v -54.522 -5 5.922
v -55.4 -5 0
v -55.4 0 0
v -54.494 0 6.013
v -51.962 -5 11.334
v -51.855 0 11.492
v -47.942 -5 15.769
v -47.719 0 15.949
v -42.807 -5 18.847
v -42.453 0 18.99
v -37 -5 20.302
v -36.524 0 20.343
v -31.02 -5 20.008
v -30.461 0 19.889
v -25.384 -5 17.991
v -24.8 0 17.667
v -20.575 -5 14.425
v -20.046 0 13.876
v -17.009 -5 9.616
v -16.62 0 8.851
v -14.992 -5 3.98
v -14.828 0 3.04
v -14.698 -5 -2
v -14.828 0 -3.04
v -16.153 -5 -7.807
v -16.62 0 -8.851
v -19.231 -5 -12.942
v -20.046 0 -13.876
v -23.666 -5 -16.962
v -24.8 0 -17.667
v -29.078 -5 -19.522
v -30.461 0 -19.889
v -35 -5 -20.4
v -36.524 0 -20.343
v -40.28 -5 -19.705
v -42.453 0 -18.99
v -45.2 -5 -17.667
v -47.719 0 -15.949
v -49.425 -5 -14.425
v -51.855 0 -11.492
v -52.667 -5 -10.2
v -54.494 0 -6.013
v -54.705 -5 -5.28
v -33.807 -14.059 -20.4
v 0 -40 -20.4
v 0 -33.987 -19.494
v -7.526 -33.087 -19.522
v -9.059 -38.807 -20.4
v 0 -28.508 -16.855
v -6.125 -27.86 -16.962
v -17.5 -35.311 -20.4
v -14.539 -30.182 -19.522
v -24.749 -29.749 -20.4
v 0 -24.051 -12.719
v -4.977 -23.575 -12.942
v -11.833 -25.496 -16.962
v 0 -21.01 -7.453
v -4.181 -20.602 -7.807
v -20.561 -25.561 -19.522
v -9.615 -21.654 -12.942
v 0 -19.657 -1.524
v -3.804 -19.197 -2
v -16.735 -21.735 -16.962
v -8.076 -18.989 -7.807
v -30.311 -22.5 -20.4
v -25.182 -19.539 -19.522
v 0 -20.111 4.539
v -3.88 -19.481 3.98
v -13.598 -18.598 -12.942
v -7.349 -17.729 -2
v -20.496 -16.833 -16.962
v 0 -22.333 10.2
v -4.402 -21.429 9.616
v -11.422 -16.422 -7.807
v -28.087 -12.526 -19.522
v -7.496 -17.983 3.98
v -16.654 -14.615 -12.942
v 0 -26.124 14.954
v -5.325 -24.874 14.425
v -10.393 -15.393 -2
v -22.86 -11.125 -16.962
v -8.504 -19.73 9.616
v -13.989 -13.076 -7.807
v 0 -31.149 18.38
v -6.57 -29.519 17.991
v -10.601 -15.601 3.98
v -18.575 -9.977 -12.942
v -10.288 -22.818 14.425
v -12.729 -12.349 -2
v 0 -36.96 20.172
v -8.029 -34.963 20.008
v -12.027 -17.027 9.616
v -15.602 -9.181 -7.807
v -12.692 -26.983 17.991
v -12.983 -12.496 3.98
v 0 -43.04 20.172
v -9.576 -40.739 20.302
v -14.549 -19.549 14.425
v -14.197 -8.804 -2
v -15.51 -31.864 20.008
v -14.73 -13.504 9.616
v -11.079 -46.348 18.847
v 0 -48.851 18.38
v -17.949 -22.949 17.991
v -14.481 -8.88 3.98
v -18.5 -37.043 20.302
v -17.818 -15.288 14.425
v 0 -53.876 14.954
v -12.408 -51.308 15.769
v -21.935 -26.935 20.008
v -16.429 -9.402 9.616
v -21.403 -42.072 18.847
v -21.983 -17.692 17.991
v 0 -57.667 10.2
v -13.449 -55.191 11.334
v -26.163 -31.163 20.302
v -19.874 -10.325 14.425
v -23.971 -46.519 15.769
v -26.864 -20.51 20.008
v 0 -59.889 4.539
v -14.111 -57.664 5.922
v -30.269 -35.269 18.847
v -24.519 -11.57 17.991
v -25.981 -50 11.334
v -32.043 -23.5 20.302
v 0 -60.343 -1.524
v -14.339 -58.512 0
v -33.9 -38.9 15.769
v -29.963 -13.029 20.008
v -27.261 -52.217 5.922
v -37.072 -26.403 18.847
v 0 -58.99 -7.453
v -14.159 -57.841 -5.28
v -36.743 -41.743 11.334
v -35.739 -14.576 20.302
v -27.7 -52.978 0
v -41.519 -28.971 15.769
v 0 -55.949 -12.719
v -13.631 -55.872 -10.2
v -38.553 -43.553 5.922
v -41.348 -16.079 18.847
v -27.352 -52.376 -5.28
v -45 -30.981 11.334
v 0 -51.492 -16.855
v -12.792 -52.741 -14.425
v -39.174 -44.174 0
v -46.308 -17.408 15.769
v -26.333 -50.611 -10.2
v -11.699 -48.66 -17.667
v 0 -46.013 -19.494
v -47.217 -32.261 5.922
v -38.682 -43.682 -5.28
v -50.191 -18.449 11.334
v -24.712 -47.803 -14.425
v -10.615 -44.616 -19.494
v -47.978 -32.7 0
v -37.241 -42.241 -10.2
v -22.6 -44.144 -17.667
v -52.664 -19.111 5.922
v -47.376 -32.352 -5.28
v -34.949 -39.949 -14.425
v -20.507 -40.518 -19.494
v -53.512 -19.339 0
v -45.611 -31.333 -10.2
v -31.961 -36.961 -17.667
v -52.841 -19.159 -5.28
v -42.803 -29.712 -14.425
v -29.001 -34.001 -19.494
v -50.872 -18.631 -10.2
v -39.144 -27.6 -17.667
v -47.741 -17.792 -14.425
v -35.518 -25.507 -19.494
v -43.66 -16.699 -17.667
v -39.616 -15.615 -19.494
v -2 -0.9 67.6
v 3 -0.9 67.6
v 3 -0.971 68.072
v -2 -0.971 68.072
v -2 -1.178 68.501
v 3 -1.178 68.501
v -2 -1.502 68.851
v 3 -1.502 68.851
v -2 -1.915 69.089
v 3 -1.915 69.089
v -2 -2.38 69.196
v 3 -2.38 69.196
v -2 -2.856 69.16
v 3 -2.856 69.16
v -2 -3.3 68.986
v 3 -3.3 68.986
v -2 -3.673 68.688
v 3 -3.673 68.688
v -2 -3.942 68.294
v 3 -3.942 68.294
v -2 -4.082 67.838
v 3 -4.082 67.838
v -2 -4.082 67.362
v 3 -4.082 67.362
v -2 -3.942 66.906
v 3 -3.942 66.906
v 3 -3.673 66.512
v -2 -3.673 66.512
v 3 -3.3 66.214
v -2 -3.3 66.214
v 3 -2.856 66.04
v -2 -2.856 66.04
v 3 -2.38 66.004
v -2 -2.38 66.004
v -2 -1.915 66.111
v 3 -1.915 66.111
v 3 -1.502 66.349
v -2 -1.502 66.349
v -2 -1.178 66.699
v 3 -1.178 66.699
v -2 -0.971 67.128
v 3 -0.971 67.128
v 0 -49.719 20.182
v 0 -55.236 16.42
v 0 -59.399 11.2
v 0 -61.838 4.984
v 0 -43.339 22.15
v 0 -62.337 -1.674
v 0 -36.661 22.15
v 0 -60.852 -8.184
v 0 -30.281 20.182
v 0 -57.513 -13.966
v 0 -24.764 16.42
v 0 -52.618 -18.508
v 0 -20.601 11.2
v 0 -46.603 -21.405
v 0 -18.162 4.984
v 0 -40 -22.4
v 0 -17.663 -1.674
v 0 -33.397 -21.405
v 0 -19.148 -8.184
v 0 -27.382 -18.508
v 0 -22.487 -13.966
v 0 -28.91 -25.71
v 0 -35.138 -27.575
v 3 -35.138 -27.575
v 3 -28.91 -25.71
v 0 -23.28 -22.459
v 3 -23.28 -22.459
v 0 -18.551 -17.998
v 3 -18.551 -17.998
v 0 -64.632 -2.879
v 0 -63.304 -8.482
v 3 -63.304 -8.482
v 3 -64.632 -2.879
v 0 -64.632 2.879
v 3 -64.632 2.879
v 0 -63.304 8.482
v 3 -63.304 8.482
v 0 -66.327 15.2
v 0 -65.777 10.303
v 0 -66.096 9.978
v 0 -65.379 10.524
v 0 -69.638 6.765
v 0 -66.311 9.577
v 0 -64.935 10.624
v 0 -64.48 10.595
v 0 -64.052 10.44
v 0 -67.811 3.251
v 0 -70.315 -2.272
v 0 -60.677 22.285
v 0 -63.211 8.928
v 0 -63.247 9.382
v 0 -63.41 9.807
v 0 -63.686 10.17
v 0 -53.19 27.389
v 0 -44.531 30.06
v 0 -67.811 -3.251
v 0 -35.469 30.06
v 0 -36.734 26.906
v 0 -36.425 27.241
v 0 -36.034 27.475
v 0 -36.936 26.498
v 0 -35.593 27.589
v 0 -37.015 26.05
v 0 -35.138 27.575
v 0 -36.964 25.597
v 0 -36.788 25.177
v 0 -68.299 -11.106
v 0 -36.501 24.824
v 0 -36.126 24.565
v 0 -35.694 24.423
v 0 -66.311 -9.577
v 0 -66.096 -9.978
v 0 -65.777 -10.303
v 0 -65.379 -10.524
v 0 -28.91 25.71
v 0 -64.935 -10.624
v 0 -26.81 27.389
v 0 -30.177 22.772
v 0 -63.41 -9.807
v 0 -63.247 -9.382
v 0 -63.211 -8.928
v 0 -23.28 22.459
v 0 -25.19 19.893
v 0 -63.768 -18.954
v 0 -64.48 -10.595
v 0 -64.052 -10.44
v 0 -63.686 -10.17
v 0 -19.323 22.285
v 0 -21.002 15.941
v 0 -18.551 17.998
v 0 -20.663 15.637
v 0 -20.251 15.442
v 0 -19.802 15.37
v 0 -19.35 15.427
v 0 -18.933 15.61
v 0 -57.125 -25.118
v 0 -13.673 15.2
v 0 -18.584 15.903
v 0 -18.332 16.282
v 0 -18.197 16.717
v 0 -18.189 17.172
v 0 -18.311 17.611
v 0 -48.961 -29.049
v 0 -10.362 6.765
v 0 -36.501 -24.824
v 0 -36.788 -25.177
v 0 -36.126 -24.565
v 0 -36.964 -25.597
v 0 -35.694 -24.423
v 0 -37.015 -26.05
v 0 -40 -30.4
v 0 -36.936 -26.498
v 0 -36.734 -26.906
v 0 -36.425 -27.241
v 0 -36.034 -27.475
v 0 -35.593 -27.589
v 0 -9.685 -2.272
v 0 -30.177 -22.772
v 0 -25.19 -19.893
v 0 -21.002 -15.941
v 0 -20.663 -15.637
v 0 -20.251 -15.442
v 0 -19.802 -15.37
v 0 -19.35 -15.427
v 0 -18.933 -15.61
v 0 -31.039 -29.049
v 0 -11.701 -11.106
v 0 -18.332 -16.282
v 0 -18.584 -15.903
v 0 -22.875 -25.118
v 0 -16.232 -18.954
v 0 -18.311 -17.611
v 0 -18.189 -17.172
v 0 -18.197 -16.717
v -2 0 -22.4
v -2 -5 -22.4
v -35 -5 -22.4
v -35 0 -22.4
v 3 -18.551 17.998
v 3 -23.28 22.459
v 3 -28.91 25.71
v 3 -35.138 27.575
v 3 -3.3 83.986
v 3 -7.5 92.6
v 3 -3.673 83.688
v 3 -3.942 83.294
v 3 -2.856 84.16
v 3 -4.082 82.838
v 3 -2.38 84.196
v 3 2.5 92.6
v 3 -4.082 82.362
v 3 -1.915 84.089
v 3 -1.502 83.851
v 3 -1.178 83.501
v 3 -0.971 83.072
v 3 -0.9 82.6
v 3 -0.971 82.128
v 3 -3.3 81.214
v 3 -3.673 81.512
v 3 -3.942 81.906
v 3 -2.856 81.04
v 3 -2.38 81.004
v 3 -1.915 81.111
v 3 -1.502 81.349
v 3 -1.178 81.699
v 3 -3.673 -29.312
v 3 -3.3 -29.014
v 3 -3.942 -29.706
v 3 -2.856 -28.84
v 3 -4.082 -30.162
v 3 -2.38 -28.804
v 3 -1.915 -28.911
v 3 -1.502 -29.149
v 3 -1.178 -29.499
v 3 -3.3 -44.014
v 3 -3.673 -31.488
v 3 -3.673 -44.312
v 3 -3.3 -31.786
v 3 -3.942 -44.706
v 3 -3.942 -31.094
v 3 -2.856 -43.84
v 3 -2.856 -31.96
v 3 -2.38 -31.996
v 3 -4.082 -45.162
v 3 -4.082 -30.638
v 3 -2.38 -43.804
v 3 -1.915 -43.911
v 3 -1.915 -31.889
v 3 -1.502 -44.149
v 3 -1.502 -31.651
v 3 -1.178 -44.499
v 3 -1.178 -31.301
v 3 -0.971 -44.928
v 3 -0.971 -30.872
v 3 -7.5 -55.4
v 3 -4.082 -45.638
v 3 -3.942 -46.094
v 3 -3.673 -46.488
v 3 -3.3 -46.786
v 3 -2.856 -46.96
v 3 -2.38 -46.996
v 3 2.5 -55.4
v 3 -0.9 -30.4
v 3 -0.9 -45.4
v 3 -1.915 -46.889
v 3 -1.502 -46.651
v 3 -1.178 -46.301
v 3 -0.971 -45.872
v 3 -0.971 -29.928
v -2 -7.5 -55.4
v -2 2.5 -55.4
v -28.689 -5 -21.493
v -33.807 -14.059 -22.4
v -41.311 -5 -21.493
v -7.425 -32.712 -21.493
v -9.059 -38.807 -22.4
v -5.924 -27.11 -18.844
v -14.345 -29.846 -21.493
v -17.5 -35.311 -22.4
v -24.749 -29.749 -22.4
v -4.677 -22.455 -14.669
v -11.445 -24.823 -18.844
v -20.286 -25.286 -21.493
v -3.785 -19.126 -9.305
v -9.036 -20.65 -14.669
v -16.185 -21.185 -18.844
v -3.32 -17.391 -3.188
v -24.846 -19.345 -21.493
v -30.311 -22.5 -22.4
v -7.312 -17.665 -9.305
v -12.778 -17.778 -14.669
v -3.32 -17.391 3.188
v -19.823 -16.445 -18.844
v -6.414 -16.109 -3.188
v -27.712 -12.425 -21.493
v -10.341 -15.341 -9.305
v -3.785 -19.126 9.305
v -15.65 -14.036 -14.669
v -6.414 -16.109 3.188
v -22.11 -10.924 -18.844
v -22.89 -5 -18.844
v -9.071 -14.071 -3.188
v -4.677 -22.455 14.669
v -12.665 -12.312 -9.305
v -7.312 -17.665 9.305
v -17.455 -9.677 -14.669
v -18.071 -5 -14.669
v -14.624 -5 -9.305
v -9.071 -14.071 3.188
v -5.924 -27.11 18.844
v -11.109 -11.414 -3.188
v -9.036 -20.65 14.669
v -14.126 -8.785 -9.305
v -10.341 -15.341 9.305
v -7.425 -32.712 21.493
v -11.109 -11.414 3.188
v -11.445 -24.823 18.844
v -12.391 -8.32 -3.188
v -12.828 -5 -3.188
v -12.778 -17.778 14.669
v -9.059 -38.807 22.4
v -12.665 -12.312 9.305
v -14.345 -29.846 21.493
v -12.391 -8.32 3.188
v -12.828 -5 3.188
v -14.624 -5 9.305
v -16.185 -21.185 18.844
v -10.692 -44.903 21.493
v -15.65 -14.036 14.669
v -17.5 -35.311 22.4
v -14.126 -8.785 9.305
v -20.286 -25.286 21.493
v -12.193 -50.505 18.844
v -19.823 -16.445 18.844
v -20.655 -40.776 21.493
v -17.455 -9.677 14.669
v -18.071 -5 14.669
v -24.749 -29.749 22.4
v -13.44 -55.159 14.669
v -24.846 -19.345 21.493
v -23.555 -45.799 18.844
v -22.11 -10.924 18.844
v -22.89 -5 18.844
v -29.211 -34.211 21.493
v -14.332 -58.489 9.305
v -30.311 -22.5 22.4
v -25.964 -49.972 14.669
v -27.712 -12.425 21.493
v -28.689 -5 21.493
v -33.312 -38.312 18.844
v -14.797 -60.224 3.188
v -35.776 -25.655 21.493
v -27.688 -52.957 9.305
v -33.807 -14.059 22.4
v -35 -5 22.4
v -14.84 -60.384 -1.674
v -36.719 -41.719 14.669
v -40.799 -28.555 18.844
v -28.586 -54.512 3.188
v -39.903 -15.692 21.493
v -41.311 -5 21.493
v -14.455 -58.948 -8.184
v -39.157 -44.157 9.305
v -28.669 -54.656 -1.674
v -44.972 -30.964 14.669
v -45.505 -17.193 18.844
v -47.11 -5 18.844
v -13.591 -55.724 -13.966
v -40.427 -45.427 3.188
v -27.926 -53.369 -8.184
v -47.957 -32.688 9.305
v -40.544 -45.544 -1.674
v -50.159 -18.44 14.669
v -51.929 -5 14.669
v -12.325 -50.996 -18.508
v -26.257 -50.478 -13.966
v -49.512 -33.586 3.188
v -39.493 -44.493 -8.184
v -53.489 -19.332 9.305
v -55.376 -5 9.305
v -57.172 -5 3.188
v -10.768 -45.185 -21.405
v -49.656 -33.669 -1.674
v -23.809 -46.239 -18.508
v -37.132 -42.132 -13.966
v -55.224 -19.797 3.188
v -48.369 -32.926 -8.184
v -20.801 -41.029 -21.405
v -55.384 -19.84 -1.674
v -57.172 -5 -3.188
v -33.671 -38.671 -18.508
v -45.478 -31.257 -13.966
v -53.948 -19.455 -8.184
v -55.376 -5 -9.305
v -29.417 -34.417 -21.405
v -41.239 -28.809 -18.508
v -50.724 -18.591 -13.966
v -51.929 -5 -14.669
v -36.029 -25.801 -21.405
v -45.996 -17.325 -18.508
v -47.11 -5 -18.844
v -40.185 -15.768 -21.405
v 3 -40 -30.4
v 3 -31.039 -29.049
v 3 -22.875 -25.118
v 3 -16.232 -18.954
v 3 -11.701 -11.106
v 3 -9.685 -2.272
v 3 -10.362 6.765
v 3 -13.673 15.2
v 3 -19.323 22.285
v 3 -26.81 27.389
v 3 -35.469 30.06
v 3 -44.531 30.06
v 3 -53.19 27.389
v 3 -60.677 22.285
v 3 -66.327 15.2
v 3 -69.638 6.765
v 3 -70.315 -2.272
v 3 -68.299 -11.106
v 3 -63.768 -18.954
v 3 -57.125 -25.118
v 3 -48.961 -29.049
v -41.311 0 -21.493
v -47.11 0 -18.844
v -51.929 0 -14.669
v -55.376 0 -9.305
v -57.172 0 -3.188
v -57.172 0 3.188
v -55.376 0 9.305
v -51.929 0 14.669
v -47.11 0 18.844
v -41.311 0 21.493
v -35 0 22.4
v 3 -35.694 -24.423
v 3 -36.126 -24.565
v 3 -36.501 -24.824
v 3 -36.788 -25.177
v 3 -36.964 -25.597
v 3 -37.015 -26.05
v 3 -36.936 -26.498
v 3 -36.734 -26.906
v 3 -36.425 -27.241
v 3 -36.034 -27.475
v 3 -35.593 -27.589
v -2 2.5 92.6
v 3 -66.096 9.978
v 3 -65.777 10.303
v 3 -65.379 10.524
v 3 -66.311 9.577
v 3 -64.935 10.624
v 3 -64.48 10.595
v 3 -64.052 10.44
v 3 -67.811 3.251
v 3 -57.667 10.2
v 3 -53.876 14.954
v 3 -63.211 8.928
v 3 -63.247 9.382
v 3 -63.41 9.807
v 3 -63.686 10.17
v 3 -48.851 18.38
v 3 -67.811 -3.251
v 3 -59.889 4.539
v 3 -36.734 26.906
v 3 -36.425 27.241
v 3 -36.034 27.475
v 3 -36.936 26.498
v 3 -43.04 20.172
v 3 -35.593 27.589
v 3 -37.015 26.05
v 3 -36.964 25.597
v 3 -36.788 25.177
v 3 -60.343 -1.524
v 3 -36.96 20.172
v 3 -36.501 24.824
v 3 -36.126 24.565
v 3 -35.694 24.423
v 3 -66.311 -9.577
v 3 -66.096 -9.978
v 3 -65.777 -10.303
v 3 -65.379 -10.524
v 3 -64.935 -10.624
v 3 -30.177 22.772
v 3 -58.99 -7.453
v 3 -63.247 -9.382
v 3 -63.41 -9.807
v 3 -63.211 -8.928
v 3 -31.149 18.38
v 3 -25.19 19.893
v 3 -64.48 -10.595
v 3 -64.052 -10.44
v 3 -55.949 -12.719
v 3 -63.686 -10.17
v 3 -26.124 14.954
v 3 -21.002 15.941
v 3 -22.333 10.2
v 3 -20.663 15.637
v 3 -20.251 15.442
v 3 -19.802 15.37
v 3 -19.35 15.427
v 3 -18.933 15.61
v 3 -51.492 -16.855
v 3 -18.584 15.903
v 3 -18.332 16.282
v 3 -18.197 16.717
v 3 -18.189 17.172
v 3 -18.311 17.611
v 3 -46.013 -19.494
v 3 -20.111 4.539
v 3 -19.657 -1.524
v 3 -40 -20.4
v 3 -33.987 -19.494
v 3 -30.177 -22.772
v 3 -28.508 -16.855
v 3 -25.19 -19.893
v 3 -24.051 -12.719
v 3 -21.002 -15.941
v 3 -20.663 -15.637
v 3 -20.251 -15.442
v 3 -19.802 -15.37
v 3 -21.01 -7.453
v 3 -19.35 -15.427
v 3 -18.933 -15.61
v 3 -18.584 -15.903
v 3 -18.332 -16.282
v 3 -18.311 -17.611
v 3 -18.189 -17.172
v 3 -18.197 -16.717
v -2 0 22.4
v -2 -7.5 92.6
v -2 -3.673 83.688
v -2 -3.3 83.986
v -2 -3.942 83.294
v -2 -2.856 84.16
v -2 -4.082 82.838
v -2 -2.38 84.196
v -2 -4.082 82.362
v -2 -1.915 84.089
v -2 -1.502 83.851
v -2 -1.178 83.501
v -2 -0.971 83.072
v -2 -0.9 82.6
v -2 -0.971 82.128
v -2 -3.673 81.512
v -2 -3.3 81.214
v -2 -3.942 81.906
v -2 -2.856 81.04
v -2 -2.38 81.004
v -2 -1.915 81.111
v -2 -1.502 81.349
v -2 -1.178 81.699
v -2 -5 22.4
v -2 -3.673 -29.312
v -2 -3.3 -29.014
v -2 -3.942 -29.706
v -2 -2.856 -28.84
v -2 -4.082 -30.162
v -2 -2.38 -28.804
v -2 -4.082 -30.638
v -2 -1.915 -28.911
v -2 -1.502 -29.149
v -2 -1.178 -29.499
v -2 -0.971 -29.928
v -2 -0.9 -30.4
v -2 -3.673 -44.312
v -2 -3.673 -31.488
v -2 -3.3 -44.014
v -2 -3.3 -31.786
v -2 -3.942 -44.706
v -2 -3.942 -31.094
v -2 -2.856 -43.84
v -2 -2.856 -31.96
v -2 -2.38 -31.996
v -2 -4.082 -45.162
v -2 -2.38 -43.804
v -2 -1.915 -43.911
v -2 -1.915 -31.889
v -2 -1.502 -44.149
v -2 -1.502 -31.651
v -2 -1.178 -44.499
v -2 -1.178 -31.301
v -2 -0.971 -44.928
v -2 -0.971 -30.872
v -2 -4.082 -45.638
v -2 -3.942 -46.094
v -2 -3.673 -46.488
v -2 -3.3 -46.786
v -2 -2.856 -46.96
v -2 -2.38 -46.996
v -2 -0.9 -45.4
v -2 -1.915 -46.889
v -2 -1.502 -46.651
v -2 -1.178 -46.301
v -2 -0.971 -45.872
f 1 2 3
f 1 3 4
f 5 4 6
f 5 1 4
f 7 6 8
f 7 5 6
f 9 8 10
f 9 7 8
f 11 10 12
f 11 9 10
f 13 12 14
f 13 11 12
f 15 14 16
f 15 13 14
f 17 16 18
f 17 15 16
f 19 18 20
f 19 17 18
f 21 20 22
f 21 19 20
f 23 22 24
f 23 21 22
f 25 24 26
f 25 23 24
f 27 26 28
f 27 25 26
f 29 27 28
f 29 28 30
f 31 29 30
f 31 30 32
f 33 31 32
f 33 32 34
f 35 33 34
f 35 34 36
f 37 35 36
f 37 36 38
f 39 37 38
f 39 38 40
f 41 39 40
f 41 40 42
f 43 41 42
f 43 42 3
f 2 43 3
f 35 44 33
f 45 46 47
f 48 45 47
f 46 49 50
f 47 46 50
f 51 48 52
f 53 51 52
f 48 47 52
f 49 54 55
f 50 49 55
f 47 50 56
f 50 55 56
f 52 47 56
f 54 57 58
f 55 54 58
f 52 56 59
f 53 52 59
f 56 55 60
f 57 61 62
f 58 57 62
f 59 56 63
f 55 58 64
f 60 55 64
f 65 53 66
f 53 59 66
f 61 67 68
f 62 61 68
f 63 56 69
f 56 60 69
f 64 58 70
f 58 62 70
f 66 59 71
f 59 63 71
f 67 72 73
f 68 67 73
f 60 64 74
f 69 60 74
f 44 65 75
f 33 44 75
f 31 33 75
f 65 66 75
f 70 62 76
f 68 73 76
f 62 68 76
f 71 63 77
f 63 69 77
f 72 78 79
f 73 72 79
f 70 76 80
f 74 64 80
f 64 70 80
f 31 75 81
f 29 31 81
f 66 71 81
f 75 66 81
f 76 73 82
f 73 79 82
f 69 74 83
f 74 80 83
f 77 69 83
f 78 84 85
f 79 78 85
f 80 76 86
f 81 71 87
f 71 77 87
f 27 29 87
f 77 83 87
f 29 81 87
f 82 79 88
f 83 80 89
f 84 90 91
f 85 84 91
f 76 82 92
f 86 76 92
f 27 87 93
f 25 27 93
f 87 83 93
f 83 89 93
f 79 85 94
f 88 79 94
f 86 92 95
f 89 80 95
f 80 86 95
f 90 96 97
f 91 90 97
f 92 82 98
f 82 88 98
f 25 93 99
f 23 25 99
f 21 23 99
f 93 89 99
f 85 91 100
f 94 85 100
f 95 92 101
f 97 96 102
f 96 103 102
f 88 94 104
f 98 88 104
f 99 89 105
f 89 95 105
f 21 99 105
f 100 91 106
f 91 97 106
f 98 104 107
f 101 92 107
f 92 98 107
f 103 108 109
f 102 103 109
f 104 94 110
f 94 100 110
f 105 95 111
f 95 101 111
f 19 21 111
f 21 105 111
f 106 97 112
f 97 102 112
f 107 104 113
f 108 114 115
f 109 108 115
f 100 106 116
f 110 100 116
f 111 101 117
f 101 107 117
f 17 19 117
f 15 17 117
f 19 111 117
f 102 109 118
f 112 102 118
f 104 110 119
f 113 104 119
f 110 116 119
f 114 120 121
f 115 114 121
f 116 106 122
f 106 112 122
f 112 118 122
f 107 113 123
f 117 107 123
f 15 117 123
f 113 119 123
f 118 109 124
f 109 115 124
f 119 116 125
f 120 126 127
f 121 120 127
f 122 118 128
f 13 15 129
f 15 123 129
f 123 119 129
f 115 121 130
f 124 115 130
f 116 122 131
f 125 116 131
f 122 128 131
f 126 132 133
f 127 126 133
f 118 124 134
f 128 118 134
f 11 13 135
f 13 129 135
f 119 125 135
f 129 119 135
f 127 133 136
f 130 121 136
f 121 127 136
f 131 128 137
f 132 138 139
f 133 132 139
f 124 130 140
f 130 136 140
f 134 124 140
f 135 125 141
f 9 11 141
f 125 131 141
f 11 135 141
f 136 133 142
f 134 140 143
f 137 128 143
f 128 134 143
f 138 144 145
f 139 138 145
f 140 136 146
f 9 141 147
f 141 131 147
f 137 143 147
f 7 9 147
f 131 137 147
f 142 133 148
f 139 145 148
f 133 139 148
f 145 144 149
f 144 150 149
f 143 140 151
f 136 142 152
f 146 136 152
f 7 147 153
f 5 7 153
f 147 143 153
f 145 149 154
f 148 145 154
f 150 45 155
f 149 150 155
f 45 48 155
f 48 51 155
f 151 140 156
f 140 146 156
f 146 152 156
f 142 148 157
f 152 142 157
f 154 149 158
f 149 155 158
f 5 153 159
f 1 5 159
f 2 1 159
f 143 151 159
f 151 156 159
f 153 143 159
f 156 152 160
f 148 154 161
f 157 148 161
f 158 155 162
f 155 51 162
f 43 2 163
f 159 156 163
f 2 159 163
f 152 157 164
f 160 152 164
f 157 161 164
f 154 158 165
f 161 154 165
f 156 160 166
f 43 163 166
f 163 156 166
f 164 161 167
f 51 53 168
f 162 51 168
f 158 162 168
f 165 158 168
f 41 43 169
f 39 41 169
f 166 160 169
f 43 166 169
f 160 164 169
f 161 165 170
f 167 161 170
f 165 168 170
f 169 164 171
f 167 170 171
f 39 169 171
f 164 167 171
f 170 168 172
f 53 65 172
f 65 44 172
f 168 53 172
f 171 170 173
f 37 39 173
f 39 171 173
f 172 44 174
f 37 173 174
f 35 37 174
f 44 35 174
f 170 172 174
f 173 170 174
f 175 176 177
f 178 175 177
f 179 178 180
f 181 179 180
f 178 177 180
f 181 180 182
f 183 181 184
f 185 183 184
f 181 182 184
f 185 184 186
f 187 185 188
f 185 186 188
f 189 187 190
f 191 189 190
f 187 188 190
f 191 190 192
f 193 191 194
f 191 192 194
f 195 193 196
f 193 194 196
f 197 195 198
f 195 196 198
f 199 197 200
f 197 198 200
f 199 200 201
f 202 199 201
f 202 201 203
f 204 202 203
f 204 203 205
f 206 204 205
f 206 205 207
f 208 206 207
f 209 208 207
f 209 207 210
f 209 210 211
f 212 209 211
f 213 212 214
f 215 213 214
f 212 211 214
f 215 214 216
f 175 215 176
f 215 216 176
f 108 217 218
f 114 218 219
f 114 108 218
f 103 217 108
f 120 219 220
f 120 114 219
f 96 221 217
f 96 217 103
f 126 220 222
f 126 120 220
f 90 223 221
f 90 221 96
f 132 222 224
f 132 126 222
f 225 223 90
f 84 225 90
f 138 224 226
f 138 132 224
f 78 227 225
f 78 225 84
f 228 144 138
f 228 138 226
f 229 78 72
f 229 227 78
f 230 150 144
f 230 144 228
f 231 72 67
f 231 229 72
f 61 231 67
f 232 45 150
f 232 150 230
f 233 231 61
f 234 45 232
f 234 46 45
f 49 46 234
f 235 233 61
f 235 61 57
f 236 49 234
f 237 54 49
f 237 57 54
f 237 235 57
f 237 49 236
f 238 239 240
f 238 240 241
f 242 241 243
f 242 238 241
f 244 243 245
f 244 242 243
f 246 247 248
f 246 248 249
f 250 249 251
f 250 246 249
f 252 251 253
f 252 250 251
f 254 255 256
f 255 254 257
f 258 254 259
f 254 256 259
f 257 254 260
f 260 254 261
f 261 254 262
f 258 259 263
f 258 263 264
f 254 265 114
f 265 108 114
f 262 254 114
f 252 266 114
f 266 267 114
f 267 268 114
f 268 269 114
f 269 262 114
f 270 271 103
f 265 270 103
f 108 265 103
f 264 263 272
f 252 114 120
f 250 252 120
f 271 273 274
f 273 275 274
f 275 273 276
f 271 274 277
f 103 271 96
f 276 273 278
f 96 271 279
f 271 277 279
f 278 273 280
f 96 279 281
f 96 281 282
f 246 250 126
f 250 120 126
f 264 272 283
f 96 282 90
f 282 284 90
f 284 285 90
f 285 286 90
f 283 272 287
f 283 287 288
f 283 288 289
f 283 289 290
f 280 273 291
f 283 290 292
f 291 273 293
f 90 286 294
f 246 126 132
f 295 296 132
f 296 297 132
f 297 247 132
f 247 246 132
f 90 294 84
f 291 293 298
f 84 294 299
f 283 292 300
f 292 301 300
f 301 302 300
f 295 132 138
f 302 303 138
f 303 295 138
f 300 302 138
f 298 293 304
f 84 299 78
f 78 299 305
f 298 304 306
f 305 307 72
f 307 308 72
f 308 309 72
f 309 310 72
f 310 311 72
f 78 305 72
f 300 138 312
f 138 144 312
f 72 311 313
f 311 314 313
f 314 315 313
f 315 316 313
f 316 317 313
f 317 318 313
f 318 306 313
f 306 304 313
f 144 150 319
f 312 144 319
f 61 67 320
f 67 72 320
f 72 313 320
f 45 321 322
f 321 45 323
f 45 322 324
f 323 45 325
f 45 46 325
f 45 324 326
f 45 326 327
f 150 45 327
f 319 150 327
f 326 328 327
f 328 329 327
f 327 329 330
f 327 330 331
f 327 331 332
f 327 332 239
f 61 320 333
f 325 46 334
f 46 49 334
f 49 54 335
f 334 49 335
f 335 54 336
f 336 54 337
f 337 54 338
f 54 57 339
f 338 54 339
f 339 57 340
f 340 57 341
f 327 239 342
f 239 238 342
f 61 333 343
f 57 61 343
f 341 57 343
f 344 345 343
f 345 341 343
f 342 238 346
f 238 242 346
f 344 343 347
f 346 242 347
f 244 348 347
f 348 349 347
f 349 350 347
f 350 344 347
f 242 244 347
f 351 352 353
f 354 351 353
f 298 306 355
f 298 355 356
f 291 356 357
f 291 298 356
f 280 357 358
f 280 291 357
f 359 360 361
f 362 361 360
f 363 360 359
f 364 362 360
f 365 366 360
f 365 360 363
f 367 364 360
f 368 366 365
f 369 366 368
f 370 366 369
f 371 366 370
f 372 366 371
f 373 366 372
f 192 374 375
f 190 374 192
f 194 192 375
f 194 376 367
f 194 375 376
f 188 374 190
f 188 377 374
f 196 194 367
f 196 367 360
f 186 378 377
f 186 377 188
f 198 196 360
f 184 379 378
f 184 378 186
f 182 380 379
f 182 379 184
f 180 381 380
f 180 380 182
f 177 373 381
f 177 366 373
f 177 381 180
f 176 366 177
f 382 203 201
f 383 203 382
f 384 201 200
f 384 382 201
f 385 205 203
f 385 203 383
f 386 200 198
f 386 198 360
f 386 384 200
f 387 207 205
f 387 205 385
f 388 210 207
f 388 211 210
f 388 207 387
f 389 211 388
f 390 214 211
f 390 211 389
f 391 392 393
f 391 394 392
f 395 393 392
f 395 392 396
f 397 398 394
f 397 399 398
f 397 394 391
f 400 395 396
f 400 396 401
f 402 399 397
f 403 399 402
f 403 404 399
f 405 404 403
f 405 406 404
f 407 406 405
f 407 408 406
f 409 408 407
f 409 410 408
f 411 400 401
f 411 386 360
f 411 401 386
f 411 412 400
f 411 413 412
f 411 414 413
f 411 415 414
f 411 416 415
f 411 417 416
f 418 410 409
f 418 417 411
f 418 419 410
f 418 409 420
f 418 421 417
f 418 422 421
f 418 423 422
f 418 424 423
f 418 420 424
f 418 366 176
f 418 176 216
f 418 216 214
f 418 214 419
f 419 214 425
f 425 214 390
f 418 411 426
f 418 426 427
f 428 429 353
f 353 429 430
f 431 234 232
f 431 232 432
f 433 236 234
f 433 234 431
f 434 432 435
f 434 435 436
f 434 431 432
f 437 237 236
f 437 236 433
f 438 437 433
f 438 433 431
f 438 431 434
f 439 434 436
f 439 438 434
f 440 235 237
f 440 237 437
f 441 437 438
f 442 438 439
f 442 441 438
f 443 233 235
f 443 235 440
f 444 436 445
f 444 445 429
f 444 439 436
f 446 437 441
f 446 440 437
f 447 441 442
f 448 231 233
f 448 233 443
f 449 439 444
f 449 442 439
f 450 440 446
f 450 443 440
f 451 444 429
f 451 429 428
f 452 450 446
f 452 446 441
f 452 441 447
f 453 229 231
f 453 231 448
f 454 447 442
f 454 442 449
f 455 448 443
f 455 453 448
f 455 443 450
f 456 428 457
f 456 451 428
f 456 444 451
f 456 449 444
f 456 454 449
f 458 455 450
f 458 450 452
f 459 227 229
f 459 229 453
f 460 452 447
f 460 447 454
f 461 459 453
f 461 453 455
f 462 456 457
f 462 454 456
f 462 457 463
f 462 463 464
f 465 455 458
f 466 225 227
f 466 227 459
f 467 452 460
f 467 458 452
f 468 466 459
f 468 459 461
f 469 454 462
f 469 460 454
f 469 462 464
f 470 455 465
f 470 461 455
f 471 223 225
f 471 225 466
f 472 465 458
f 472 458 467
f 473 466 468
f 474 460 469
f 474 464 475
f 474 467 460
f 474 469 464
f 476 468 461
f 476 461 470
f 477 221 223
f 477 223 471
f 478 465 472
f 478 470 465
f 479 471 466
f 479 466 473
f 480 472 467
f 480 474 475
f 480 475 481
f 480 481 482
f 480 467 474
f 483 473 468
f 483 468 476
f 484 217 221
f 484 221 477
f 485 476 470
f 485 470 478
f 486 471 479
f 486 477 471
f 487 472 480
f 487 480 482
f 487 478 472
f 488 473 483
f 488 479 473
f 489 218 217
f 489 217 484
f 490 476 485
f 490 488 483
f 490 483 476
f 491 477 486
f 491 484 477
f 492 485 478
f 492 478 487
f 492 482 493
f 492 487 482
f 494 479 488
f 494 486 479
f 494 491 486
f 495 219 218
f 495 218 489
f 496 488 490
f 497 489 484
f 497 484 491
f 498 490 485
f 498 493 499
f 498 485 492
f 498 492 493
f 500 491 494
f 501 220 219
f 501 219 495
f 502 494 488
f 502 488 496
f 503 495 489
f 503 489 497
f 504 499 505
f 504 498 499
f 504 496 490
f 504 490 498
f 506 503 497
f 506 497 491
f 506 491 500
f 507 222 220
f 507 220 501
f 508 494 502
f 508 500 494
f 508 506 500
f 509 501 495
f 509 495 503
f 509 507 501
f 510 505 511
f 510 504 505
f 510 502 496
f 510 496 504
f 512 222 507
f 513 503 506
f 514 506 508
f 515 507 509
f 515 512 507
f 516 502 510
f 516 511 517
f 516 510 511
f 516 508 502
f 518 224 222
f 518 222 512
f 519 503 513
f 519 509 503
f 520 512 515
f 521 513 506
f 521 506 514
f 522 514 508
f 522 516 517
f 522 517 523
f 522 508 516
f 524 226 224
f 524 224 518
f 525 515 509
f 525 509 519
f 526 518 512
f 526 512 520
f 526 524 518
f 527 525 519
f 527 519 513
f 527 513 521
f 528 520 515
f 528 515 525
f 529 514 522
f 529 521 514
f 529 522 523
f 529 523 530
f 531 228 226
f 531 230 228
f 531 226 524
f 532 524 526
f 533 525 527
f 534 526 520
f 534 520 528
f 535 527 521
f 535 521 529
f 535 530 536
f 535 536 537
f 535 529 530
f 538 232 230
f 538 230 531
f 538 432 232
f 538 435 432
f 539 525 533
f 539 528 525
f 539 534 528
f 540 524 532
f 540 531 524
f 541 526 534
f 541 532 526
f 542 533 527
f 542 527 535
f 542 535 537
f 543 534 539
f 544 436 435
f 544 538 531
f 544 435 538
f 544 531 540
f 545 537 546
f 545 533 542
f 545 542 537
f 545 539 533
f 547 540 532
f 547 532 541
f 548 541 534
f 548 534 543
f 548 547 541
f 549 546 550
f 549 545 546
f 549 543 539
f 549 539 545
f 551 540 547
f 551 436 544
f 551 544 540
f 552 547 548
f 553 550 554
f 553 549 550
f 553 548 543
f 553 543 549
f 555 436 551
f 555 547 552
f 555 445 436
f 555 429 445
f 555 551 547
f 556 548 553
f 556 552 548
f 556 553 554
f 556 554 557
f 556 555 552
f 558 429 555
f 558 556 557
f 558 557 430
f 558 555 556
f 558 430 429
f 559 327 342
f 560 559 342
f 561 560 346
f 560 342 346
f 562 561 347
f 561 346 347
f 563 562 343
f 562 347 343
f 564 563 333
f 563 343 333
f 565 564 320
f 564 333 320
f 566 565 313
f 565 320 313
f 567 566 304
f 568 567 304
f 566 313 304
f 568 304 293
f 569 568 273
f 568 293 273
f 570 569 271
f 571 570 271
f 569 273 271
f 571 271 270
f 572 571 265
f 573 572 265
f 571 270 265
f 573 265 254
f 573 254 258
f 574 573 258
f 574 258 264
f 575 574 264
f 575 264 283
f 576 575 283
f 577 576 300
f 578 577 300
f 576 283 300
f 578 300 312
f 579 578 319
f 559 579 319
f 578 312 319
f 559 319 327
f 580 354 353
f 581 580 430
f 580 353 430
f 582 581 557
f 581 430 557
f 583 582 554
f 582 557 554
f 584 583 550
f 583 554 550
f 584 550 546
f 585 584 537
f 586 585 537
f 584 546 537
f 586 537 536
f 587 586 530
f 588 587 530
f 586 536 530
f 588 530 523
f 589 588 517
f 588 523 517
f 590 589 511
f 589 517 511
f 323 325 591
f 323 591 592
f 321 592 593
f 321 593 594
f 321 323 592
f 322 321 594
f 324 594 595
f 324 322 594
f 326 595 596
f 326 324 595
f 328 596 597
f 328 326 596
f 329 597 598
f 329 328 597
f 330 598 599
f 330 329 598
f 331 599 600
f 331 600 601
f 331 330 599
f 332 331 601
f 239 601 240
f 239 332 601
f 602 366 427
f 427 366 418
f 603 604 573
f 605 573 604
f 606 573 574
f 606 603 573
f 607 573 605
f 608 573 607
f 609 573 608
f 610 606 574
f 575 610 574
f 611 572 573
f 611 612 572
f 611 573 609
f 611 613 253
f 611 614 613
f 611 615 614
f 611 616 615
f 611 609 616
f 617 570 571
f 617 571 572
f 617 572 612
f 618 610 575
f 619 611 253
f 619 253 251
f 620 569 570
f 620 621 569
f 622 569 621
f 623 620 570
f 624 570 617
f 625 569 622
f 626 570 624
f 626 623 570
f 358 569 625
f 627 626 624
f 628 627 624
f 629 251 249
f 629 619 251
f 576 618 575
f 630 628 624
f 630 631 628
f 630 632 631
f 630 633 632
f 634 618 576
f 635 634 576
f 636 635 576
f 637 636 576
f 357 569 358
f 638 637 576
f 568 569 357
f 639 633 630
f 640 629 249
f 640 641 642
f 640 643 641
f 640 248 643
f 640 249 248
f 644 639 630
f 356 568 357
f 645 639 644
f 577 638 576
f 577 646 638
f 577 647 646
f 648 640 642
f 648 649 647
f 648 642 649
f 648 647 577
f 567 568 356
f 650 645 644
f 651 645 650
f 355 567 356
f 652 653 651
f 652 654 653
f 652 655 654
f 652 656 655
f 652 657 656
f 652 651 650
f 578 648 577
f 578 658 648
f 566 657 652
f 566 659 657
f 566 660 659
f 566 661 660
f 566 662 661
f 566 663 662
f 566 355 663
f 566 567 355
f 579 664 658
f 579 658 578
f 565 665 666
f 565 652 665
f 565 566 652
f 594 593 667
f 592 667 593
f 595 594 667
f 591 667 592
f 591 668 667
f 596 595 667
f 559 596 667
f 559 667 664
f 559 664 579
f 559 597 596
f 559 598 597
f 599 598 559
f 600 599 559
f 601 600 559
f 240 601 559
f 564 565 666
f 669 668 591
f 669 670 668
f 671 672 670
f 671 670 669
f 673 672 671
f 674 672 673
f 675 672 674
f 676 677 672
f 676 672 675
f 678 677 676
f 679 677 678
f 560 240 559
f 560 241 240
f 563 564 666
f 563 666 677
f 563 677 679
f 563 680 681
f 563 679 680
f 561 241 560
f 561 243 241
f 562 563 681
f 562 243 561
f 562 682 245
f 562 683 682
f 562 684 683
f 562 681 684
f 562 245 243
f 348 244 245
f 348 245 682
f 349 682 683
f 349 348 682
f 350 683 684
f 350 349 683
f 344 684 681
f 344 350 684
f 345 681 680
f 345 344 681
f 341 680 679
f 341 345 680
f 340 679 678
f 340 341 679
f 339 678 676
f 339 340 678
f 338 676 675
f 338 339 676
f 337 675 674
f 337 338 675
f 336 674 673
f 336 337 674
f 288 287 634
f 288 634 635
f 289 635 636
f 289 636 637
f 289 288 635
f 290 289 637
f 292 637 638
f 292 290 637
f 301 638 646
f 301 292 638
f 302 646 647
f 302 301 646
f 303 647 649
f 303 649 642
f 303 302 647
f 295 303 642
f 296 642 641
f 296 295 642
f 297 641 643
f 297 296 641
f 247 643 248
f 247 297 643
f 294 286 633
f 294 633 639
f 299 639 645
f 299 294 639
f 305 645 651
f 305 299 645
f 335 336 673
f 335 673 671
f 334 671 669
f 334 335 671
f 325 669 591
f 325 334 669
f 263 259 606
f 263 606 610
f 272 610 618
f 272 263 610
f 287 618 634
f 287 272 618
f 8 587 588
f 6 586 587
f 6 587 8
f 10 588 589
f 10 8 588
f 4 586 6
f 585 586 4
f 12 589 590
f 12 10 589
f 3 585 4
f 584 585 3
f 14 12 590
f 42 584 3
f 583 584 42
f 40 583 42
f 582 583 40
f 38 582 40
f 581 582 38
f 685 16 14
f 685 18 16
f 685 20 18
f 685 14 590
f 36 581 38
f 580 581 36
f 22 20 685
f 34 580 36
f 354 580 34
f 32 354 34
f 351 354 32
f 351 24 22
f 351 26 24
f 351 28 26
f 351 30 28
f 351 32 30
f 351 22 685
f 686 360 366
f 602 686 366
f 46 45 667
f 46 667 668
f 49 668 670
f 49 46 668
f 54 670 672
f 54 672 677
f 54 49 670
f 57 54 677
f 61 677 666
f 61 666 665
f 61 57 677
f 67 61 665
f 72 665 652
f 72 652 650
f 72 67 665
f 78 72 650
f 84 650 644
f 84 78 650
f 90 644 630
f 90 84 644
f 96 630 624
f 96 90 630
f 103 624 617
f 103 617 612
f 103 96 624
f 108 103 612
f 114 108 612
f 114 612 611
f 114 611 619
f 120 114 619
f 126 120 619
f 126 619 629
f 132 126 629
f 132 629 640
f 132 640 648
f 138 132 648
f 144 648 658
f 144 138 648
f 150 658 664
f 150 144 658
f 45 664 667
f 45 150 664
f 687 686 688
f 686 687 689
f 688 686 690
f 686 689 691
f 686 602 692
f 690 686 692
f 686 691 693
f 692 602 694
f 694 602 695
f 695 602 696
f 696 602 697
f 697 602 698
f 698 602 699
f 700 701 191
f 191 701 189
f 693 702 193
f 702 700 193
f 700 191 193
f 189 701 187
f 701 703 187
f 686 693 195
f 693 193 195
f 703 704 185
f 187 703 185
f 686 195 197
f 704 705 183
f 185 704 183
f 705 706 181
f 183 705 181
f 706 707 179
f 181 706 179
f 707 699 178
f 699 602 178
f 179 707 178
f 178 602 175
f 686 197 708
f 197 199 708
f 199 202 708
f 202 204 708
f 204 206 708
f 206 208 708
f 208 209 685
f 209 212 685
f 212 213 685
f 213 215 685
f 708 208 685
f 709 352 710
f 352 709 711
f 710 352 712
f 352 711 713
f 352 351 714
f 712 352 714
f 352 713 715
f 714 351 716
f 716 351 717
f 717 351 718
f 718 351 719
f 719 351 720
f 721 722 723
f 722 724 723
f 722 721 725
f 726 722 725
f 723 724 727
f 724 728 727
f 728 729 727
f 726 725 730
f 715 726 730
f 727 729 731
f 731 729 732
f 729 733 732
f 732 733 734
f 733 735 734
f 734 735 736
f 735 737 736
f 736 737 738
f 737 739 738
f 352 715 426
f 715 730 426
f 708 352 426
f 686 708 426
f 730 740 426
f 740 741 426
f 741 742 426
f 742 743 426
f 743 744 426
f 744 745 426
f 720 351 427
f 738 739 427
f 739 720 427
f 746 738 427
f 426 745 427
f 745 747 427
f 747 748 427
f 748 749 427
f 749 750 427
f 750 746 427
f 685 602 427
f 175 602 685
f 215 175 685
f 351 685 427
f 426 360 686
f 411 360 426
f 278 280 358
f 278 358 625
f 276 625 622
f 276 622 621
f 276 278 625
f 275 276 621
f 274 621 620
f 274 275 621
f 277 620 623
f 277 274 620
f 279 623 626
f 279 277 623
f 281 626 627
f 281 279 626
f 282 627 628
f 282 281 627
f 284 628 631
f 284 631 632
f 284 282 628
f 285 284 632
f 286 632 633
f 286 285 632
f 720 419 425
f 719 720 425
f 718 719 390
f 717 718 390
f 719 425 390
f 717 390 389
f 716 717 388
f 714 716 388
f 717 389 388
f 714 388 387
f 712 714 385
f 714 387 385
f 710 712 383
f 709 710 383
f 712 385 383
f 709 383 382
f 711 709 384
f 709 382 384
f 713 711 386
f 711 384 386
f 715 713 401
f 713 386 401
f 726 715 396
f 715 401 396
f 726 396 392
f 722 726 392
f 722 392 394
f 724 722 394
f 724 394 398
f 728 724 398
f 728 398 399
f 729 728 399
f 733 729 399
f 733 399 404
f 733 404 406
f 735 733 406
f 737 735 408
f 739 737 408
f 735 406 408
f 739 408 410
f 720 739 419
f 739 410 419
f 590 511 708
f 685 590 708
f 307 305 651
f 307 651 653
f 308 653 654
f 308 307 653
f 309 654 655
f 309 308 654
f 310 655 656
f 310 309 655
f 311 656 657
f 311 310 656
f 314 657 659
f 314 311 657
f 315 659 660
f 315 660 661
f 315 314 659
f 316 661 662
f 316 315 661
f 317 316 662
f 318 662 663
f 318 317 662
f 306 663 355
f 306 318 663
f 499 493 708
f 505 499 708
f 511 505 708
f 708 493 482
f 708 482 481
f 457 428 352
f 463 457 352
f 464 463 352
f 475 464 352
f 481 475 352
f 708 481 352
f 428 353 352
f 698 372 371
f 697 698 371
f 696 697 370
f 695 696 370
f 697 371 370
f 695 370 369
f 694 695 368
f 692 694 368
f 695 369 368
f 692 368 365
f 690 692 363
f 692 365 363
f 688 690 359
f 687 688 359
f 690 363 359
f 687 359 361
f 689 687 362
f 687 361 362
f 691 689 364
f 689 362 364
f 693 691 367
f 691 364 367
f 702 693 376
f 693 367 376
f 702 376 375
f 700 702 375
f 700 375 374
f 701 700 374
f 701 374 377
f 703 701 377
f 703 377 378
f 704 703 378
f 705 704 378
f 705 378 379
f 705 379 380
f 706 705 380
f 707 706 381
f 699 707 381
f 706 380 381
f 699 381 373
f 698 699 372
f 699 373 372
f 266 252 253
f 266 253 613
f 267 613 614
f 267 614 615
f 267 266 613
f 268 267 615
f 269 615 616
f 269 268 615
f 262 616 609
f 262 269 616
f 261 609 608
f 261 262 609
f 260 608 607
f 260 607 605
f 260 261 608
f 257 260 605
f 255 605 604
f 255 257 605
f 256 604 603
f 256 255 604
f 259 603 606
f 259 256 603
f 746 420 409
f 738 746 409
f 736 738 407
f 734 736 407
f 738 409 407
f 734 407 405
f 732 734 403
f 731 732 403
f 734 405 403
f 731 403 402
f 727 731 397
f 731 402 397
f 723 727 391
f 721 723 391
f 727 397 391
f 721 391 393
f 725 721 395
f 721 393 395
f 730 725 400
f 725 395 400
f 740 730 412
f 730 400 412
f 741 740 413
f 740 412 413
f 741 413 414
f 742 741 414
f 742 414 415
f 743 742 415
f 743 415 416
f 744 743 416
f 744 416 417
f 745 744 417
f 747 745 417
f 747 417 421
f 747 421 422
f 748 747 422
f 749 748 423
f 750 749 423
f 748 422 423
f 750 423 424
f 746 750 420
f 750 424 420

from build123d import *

# Parameters (mm, degrees)
SKETCH1_R           = 22.4
SKETCH1_R_2         = 20.4
REVOLVE1_ANGLE      = 90
SKETCH1_194_R       = 30.4
SKETCH1_194_R_2     = 20.4
BOSS_EXTRUDE1_DEPTH = 3
SKETCH4_R           = 20.4
BOSS_EXTRUDE3_DEPTH = 5
SKETCH5_W           = 148
SKETCH5_H           = 10
SKETCH5_R           = 1.6
BOSS_EXTRUDE4_DEPTH = 5


with BuildPart() as part:
    # Sketch1 → Revolve1 (revolve)
    with BuildSketch(Plane(origin=(0, 0, 0), x_dir=(0, 0, -1), z_dir=(1, 0, 0))):
        with Locations((0, -40)):
            Circle(SKETCH1_R)
        with Locations((0, -40)):
            Circle(SKETCH1_R_2, mode=Mode.SUBTRACT)
    revolve(axis=Axis((0, -5, 90.771329453), (0, 0, -1)), revolution_arc=REVOLVE1_ANGLE)

    # Sketch4 → Boss-Extrude3 (add)
    with BuildSketch(Plane(origin=(0, -5, 0), x_dir=(1, 0, 0), z_dir=(0, 1, 0))):
        with BuildLine():
            Line((3, -22.4), (3, 22.4))
            Line((3, 22.4), (-35, 22.4))
            ThreePointArc((-35, 22.4), (-57.4, 0), (-35, -22.4))
            Line((-35, -22.4), (3, -22.4))
        make_face()
        with Locations((-35, 0)):
            Circle(SKETCH4_R, mode=Mode.SUBTRACT)
    extrude(amount=BOSS_EXTRUDE3_DEPTH)

    # Sketch5 → Boss-Extrude4 (add)
    with BuildSketch(Plane(origin=(3, 0, 0), x_dir=(0, 0, -1), z_dir=(1, 0, 0))):
        with Locations((-18.6, -2.5)):
            Rectangle(SKETCH5_W, SKETCH5_H)
        with Locations((30.4, -2.5)):
            Circle(SKETCH5_R, mode=Mode.SUBTRACT)
        with Locations((45.4, -2.5)):
            Circle(SKETCH5_R, mode=Mode.SUBTRACT)
        with Locations((-82.6, -2.5)):
            Circle(SKETCH5_R, mode=Mode.SUBTRACT)
        with Locations((-67.6, -2.5)):
            Circle(SKETCH5_R, mode=Mode.SUBTRACT)
    extrude(amount=-BOSS_EXTRUDE4_DEPTH)


with BuildPart() as body_2:
    # Sketch1<194> → Boss-Extrude1 (new body)
    with BuildSketch(Plane(origin=(0, 0, 0), x_dir=(0, 0, -1), z_dir=(1, 0, 0))):
        with Locations((0, -40)):
            Circle(SKETCH1_194_R)
        with Locations((0, -40)):
            Circle(SKETCH1_194_R_2, mode=Mode.SUBTRACT)
        with BuildLine():
            ThreePointArc((9.576564013, -66.311393382), (0, -68), (-9.576564013, -66.311393382))
            ThreePointArc((-9.576564013, -66.311393382), (-10.532839977, -64.260652959), (-8.482099554, -63.304376995))
            ThreePointArc((-8.482099554, -63.304376995), (0, -64.8), (8.482099554, -63.304376995))
            ThreePointArc((8.482099554, -63.304376995), (10.532839977, -64.260652959), (9.576564013, -66.311393382))
        make_face(mode=Mode.SUBTRACT)
        with BuildLine():
            ThreePointArc((27.574617084, -35.137851025), (26.276761764, -36.991380514), (24.423232275, -35.693525194))
            ThreePointArc((24.423232275, -35.693525194), (21.477430014, -27.6), (15.94113272, -21.002097811))
            ThreePointArc((15.94113272, -21.002097811), (15.743921787, -18.747966526), (17.998053071, -18.550755593))
            ThreePointArc((17.998053071, -18.550755593), (24.248711306, -26), (27.574617084, -35.137851025))
        make_face(mode=Mode.SUBTRACT)
        with BuildLine():
            ThreePointArc((-27.574617084, -35.137851025), (-24.248711306, -26), (-17.998053071, -18.550755593))
            ThreePointArc((-17.998053071, -18.550755593), (-15.743921787, -18.747966526), (-15.94113272, -21.002097811))
            ThreePointArc((-15.94113272, -21.002097811), (-21.477430014, -27.6), (-24.423232275, -35.693525194))
            ThreePointArc((-24.423232275, -35.693525194), (-26.276761764, -36.991380514), (-27.574617084, -35.137851025))
        make_face(mode=Mode.SUBTRACT)
    extrude(amount=BOSS_EXTRUDE1_DEPTH)


solid = Compound([part.part, body_2.part])
